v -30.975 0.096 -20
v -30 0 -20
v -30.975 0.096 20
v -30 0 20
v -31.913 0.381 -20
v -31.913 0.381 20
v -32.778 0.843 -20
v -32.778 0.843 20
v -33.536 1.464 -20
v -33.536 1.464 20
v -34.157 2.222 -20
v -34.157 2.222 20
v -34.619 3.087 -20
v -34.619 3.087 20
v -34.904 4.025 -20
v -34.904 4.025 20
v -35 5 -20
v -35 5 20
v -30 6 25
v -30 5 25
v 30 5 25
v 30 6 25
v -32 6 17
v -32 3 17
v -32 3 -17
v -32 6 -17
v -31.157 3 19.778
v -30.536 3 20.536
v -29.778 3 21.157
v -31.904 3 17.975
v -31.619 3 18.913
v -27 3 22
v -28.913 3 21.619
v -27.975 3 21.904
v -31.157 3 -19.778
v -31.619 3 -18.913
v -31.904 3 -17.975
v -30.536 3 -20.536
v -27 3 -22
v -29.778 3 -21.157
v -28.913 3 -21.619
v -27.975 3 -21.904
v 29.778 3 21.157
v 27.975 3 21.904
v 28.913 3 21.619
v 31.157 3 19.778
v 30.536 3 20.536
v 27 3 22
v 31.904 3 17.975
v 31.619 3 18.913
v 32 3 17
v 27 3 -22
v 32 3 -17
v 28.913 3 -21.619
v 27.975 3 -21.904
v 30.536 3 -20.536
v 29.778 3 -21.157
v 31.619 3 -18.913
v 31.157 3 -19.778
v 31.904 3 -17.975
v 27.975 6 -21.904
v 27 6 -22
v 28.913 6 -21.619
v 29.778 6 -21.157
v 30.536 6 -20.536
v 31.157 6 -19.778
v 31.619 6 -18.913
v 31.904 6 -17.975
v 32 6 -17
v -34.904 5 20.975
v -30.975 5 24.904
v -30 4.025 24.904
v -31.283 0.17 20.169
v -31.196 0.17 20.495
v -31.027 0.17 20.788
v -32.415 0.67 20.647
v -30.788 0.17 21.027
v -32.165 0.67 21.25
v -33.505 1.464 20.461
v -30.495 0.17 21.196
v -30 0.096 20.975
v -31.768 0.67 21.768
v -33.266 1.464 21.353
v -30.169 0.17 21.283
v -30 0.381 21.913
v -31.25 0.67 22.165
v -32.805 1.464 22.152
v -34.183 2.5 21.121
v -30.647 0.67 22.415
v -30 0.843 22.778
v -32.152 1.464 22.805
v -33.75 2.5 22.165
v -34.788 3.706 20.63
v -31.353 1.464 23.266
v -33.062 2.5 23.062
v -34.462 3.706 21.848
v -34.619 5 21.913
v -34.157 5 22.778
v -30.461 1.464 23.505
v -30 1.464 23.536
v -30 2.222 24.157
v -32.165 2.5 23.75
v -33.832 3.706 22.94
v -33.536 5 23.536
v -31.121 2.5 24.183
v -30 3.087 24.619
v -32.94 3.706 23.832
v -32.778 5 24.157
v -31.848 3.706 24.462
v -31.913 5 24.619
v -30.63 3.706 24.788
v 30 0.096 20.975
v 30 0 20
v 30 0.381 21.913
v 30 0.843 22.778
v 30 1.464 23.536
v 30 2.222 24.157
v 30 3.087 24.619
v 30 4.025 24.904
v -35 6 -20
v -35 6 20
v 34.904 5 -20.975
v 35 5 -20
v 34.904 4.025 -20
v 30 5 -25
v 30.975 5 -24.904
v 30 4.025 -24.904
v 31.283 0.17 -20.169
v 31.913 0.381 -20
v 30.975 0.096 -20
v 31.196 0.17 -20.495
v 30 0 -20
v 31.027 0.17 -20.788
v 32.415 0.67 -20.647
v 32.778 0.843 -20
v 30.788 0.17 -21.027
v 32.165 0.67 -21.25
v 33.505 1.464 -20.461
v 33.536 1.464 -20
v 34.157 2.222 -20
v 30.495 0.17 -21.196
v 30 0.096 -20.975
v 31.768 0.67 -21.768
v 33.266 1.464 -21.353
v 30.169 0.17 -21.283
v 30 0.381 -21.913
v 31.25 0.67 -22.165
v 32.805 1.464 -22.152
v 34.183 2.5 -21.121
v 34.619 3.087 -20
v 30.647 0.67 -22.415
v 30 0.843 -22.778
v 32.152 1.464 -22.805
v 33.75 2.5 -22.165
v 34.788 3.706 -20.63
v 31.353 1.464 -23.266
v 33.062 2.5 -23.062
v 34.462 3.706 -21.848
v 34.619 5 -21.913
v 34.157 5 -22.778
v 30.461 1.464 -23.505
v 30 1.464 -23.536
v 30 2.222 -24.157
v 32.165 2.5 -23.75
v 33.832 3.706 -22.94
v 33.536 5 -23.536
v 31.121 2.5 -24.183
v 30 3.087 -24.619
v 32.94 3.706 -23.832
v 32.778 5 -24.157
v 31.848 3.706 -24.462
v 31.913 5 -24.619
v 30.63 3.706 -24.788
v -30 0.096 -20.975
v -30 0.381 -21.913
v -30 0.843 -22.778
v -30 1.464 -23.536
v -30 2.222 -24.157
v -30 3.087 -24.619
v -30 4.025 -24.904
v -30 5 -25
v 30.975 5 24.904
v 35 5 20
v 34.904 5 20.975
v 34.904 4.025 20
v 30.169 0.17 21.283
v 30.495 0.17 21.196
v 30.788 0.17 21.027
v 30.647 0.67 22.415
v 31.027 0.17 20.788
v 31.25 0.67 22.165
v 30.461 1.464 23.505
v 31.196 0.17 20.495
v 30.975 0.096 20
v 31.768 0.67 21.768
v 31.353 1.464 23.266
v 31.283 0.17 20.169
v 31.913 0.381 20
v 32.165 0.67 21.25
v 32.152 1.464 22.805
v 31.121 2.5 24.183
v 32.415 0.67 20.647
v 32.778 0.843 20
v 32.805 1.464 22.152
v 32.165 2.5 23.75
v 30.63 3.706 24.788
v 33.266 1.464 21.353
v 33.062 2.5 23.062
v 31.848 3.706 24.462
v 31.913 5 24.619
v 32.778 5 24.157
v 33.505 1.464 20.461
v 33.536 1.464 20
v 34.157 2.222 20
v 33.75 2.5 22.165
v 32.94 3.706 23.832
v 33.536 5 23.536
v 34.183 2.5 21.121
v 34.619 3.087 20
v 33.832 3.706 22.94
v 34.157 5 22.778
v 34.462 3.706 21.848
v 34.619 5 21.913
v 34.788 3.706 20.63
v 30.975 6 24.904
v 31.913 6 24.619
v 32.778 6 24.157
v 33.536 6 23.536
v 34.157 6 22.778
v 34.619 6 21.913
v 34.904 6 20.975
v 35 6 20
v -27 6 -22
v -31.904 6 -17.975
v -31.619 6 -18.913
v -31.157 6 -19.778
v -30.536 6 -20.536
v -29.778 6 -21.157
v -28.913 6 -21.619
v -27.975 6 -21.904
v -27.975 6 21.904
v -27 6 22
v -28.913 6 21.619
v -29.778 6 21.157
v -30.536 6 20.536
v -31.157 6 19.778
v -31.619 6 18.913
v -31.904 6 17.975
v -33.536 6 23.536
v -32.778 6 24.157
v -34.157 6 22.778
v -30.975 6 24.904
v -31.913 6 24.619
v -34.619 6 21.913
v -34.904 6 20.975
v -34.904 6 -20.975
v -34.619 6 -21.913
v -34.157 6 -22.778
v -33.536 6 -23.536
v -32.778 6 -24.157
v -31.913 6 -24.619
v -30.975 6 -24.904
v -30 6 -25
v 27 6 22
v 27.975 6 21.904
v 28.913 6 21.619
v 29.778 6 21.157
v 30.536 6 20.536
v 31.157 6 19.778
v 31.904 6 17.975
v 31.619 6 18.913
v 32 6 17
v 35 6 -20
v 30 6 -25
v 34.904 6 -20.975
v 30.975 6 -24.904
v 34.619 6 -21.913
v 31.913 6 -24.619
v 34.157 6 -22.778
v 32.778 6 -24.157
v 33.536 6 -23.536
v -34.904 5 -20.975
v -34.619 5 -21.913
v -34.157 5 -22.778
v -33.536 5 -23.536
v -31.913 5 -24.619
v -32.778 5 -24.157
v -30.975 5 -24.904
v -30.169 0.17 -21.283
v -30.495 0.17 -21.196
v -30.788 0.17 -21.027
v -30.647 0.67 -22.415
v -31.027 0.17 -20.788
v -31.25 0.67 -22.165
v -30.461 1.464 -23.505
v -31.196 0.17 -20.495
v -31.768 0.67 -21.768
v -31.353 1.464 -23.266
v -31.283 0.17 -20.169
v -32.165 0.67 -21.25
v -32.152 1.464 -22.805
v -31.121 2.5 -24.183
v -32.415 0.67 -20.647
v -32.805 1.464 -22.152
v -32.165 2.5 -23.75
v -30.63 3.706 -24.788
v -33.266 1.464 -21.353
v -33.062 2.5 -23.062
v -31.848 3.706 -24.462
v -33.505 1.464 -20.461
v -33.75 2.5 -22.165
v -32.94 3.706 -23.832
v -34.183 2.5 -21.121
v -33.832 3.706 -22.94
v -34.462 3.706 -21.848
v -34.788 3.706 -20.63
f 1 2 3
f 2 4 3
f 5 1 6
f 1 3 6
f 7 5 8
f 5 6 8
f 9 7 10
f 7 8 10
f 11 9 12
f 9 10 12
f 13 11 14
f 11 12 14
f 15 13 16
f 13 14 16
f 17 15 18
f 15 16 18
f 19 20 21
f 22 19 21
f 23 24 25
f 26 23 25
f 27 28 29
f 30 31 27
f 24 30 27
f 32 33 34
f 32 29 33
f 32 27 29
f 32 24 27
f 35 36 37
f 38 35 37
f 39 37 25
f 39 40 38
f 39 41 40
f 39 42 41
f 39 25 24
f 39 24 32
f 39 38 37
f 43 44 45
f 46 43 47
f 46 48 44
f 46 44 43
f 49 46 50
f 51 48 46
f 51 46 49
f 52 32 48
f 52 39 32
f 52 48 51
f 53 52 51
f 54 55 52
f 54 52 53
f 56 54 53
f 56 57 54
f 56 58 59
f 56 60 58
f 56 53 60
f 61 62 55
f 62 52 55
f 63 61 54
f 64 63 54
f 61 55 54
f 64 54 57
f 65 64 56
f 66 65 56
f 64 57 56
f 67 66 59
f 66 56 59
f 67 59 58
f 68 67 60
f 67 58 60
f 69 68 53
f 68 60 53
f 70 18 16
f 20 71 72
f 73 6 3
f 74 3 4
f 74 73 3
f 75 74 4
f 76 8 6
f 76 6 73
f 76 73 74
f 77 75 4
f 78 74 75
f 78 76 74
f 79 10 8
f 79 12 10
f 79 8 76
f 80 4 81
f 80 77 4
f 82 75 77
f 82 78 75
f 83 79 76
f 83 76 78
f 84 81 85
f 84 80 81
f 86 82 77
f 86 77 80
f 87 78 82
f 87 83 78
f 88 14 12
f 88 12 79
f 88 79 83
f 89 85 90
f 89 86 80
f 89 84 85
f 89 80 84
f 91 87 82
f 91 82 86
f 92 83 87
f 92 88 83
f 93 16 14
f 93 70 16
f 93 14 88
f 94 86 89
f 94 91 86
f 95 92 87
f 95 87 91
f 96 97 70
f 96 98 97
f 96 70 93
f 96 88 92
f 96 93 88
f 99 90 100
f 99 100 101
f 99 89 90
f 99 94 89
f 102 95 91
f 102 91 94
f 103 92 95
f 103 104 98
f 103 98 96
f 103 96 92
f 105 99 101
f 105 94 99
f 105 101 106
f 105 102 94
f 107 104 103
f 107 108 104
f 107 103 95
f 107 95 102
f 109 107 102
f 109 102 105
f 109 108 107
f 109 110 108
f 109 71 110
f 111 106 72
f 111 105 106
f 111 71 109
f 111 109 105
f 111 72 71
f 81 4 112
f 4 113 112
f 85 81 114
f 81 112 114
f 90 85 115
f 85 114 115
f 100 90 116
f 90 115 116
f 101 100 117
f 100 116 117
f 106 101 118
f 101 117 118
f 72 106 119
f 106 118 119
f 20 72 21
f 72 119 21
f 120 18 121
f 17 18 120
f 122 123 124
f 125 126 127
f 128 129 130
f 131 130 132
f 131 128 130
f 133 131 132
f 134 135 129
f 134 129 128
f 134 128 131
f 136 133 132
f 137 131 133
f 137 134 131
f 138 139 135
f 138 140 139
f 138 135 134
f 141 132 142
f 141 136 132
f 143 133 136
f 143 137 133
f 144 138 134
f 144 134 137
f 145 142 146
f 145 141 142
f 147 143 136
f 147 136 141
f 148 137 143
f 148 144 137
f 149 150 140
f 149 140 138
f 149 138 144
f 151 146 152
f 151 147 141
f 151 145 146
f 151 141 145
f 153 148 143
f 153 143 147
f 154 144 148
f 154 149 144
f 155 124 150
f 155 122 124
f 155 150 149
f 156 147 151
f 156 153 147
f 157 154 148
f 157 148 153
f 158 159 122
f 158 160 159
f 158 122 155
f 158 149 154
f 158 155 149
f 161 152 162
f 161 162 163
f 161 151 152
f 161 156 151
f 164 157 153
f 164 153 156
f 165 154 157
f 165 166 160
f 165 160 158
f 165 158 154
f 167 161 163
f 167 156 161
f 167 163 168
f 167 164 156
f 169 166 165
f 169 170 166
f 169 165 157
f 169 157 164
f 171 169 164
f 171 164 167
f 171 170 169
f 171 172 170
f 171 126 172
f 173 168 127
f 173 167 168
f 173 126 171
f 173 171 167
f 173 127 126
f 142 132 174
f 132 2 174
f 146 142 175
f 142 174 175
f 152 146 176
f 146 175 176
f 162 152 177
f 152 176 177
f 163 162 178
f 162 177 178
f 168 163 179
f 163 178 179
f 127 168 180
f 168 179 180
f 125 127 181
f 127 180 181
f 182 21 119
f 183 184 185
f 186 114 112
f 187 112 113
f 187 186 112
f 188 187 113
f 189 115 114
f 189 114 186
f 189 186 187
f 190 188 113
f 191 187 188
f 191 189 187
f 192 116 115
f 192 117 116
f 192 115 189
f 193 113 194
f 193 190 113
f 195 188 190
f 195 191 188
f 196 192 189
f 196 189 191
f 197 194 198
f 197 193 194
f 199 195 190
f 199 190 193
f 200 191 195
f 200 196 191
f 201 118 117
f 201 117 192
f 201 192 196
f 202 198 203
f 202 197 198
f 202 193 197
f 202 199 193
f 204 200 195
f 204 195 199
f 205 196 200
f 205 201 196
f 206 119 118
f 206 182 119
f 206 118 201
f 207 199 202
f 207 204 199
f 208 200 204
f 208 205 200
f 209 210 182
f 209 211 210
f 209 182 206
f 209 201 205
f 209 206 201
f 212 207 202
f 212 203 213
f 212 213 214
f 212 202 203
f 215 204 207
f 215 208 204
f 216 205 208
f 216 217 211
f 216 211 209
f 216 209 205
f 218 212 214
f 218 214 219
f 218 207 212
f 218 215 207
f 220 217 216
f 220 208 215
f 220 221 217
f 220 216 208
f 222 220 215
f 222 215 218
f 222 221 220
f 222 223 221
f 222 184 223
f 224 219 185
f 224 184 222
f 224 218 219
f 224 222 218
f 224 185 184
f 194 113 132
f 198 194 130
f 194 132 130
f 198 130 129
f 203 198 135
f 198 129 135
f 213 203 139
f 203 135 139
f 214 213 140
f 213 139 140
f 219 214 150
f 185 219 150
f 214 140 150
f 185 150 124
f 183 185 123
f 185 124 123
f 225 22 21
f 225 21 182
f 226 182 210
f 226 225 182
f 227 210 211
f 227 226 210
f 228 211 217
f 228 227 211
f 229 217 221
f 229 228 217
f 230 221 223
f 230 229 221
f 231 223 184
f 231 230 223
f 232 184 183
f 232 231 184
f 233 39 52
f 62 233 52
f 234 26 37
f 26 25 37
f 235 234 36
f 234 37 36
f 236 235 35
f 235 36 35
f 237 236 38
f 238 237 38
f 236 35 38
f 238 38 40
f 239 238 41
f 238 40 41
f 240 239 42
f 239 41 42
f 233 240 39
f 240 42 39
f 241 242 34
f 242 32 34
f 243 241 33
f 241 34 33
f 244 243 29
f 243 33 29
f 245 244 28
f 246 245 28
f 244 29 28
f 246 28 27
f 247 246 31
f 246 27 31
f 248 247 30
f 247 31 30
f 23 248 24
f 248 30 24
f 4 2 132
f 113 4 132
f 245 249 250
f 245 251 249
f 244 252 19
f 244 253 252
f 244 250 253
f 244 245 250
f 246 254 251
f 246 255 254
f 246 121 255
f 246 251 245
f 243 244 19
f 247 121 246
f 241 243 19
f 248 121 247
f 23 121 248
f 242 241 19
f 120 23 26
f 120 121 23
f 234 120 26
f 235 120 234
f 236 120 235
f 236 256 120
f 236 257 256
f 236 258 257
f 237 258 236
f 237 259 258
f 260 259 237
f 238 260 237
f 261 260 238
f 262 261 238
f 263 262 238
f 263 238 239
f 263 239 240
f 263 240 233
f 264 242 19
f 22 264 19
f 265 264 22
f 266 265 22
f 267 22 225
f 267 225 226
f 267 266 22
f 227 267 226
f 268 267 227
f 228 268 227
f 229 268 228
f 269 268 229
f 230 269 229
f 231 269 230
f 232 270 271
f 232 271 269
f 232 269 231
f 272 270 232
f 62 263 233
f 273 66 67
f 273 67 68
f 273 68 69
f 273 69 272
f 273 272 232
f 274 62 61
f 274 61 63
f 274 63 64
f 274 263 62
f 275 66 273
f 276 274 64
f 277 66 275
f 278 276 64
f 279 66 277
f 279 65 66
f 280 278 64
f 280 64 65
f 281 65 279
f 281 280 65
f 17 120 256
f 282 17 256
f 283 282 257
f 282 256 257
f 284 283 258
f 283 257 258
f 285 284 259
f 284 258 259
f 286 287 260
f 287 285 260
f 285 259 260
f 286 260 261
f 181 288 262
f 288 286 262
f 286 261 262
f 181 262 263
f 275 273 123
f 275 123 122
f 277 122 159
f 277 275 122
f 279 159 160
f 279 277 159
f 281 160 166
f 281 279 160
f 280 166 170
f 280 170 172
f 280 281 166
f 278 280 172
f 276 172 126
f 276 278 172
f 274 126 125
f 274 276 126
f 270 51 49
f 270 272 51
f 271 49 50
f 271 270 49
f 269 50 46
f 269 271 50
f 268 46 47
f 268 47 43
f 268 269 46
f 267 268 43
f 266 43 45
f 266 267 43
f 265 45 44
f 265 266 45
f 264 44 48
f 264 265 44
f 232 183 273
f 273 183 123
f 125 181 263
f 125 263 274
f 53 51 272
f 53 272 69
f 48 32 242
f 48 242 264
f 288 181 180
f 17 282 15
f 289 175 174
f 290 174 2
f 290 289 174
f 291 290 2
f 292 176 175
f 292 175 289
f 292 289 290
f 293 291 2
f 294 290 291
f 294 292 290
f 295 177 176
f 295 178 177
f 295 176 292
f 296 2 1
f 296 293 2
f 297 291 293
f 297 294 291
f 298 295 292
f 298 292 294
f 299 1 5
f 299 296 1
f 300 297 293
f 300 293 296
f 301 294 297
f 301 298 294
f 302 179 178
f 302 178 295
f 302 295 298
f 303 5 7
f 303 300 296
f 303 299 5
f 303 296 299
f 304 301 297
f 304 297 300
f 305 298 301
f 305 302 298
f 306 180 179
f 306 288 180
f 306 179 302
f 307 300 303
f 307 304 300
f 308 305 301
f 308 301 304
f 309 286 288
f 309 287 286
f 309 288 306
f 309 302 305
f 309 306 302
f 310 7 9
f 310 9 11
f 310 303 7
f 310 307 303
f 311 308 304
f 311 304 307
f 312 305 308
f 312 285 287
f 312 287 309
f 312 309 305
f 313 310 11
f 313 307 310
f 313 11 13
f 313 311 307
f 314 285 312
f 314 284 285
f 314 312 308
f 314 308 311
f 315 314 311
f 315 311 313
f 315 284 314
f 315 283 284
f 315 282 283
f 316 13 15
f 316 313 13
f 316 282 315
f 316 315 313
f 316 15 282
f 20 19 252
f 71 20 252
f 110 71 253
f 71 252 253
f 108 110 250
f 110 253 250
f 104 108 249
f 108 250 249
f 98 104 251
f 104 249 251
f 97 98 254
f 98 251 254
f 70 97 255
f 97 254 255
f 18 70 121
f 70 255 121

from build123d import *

# Parameters (mm, degrees)
SKETCH1_W           = 70
SKETCH1_H           = 50
BOSS_EXTRUDE1_DEPTH = 6
SHELL1_T            = -3
FILLET1_R           = 5
FILLET2_R           = 5
FILLET3_R           = 5
FILLET4_R           = 5
FILLET5_R           = 5
FILLET6_R           = 5
FILLET7_R           = 5
FILLET8_R           = 5
FILLET9_R           = 5


with BuildPart() as part:
    # Sketch1 → Boss-Extrude1 (new body)
    with BuildSketch(Plane(origin=(0, 0, 0), x_dir=(1, 0, 0), z_dir=(0, 1, 0))):
        Rectangle(SKETCH1_W, SKETCH1_H)
    extrude(amount=BOSS_EXTRUDE1_DEPTH)

    # Shell1
    shell1_openings = [part.faces().sort_by_distance(p)[0] for p in [
        (0, 6, 0),
    ]]
    offset(amount=SHELL1_T, openings=shell1_openings, kind=Kind.INTERSECTION)

    # Fillet1
    fillet1_edges = [part.edges().sort_by_distance(p)[0] for p in [
        (35, 3, 25),
    ]]
    fillet(fillet1_edges, radius=FILLET1_R)

    # Fillet2
    fillet2_edges = [part.edges().sort_by_distance(p)[0] for p in [
        (35, 3, -25),
    ]]
    fillet(fillet2_edges, radius=FILLET2_R)

    # Fillet3
    fillet3_edges = [part.edges().sort_by_distance(p)[0] for p in [
        (-35, 3, 25),
    ]]
    fillet(fillet3_edges, radius=FILLET3_R)

    # Fillet4
    fillet4_edges = [part.edges().sort_by_distance(p)[0] for p in [
        (-35, 3, -25),
    ]]
    fillet(fillet4_edges, radius=FILLET4_R)

    # Fillet5
    fillet5_edges = [part.edges().sort_by_distance(p)[0] for p in [
        (35, 0, 0),
        (0, 0, -25),
        (0, 0, 25),
        (-35, 0, 0),
    ]]
    fillet(fillet5_edges, radius=FILLET5_R)

    # Fillet6
    fillet6_edges = [part.edges().sort_by_distance(p)[0] for p in [
        (32, 4.5, 22),
    ]]
    fillet(fillet6_edges, radius=FILLET6_R)

    # Fillet7
    fillet7_edges = [part.edges().sort_by_distance(p)[0] for p in [
        (-32, 4.5, 22),
    ]]
    fillet(fillet7_edges, radius=FILLET7_R)

    # Fillet8
    fillet8_edges = [part.edges().sort_by_distance(p)[0] for p in [
        (-32, 4.5, -22),
    ]]
    fillet(fillet8_edges, radius=FILLET8_R)

    # Fillet9
    fillet9_edges = [part.edges().sort_by_distance(p)[0] for p in [
        (32, 4.5, -22),
    ]]
    fillet(fillet9_edges, radius=FILLET9_R)


solid = part.part
